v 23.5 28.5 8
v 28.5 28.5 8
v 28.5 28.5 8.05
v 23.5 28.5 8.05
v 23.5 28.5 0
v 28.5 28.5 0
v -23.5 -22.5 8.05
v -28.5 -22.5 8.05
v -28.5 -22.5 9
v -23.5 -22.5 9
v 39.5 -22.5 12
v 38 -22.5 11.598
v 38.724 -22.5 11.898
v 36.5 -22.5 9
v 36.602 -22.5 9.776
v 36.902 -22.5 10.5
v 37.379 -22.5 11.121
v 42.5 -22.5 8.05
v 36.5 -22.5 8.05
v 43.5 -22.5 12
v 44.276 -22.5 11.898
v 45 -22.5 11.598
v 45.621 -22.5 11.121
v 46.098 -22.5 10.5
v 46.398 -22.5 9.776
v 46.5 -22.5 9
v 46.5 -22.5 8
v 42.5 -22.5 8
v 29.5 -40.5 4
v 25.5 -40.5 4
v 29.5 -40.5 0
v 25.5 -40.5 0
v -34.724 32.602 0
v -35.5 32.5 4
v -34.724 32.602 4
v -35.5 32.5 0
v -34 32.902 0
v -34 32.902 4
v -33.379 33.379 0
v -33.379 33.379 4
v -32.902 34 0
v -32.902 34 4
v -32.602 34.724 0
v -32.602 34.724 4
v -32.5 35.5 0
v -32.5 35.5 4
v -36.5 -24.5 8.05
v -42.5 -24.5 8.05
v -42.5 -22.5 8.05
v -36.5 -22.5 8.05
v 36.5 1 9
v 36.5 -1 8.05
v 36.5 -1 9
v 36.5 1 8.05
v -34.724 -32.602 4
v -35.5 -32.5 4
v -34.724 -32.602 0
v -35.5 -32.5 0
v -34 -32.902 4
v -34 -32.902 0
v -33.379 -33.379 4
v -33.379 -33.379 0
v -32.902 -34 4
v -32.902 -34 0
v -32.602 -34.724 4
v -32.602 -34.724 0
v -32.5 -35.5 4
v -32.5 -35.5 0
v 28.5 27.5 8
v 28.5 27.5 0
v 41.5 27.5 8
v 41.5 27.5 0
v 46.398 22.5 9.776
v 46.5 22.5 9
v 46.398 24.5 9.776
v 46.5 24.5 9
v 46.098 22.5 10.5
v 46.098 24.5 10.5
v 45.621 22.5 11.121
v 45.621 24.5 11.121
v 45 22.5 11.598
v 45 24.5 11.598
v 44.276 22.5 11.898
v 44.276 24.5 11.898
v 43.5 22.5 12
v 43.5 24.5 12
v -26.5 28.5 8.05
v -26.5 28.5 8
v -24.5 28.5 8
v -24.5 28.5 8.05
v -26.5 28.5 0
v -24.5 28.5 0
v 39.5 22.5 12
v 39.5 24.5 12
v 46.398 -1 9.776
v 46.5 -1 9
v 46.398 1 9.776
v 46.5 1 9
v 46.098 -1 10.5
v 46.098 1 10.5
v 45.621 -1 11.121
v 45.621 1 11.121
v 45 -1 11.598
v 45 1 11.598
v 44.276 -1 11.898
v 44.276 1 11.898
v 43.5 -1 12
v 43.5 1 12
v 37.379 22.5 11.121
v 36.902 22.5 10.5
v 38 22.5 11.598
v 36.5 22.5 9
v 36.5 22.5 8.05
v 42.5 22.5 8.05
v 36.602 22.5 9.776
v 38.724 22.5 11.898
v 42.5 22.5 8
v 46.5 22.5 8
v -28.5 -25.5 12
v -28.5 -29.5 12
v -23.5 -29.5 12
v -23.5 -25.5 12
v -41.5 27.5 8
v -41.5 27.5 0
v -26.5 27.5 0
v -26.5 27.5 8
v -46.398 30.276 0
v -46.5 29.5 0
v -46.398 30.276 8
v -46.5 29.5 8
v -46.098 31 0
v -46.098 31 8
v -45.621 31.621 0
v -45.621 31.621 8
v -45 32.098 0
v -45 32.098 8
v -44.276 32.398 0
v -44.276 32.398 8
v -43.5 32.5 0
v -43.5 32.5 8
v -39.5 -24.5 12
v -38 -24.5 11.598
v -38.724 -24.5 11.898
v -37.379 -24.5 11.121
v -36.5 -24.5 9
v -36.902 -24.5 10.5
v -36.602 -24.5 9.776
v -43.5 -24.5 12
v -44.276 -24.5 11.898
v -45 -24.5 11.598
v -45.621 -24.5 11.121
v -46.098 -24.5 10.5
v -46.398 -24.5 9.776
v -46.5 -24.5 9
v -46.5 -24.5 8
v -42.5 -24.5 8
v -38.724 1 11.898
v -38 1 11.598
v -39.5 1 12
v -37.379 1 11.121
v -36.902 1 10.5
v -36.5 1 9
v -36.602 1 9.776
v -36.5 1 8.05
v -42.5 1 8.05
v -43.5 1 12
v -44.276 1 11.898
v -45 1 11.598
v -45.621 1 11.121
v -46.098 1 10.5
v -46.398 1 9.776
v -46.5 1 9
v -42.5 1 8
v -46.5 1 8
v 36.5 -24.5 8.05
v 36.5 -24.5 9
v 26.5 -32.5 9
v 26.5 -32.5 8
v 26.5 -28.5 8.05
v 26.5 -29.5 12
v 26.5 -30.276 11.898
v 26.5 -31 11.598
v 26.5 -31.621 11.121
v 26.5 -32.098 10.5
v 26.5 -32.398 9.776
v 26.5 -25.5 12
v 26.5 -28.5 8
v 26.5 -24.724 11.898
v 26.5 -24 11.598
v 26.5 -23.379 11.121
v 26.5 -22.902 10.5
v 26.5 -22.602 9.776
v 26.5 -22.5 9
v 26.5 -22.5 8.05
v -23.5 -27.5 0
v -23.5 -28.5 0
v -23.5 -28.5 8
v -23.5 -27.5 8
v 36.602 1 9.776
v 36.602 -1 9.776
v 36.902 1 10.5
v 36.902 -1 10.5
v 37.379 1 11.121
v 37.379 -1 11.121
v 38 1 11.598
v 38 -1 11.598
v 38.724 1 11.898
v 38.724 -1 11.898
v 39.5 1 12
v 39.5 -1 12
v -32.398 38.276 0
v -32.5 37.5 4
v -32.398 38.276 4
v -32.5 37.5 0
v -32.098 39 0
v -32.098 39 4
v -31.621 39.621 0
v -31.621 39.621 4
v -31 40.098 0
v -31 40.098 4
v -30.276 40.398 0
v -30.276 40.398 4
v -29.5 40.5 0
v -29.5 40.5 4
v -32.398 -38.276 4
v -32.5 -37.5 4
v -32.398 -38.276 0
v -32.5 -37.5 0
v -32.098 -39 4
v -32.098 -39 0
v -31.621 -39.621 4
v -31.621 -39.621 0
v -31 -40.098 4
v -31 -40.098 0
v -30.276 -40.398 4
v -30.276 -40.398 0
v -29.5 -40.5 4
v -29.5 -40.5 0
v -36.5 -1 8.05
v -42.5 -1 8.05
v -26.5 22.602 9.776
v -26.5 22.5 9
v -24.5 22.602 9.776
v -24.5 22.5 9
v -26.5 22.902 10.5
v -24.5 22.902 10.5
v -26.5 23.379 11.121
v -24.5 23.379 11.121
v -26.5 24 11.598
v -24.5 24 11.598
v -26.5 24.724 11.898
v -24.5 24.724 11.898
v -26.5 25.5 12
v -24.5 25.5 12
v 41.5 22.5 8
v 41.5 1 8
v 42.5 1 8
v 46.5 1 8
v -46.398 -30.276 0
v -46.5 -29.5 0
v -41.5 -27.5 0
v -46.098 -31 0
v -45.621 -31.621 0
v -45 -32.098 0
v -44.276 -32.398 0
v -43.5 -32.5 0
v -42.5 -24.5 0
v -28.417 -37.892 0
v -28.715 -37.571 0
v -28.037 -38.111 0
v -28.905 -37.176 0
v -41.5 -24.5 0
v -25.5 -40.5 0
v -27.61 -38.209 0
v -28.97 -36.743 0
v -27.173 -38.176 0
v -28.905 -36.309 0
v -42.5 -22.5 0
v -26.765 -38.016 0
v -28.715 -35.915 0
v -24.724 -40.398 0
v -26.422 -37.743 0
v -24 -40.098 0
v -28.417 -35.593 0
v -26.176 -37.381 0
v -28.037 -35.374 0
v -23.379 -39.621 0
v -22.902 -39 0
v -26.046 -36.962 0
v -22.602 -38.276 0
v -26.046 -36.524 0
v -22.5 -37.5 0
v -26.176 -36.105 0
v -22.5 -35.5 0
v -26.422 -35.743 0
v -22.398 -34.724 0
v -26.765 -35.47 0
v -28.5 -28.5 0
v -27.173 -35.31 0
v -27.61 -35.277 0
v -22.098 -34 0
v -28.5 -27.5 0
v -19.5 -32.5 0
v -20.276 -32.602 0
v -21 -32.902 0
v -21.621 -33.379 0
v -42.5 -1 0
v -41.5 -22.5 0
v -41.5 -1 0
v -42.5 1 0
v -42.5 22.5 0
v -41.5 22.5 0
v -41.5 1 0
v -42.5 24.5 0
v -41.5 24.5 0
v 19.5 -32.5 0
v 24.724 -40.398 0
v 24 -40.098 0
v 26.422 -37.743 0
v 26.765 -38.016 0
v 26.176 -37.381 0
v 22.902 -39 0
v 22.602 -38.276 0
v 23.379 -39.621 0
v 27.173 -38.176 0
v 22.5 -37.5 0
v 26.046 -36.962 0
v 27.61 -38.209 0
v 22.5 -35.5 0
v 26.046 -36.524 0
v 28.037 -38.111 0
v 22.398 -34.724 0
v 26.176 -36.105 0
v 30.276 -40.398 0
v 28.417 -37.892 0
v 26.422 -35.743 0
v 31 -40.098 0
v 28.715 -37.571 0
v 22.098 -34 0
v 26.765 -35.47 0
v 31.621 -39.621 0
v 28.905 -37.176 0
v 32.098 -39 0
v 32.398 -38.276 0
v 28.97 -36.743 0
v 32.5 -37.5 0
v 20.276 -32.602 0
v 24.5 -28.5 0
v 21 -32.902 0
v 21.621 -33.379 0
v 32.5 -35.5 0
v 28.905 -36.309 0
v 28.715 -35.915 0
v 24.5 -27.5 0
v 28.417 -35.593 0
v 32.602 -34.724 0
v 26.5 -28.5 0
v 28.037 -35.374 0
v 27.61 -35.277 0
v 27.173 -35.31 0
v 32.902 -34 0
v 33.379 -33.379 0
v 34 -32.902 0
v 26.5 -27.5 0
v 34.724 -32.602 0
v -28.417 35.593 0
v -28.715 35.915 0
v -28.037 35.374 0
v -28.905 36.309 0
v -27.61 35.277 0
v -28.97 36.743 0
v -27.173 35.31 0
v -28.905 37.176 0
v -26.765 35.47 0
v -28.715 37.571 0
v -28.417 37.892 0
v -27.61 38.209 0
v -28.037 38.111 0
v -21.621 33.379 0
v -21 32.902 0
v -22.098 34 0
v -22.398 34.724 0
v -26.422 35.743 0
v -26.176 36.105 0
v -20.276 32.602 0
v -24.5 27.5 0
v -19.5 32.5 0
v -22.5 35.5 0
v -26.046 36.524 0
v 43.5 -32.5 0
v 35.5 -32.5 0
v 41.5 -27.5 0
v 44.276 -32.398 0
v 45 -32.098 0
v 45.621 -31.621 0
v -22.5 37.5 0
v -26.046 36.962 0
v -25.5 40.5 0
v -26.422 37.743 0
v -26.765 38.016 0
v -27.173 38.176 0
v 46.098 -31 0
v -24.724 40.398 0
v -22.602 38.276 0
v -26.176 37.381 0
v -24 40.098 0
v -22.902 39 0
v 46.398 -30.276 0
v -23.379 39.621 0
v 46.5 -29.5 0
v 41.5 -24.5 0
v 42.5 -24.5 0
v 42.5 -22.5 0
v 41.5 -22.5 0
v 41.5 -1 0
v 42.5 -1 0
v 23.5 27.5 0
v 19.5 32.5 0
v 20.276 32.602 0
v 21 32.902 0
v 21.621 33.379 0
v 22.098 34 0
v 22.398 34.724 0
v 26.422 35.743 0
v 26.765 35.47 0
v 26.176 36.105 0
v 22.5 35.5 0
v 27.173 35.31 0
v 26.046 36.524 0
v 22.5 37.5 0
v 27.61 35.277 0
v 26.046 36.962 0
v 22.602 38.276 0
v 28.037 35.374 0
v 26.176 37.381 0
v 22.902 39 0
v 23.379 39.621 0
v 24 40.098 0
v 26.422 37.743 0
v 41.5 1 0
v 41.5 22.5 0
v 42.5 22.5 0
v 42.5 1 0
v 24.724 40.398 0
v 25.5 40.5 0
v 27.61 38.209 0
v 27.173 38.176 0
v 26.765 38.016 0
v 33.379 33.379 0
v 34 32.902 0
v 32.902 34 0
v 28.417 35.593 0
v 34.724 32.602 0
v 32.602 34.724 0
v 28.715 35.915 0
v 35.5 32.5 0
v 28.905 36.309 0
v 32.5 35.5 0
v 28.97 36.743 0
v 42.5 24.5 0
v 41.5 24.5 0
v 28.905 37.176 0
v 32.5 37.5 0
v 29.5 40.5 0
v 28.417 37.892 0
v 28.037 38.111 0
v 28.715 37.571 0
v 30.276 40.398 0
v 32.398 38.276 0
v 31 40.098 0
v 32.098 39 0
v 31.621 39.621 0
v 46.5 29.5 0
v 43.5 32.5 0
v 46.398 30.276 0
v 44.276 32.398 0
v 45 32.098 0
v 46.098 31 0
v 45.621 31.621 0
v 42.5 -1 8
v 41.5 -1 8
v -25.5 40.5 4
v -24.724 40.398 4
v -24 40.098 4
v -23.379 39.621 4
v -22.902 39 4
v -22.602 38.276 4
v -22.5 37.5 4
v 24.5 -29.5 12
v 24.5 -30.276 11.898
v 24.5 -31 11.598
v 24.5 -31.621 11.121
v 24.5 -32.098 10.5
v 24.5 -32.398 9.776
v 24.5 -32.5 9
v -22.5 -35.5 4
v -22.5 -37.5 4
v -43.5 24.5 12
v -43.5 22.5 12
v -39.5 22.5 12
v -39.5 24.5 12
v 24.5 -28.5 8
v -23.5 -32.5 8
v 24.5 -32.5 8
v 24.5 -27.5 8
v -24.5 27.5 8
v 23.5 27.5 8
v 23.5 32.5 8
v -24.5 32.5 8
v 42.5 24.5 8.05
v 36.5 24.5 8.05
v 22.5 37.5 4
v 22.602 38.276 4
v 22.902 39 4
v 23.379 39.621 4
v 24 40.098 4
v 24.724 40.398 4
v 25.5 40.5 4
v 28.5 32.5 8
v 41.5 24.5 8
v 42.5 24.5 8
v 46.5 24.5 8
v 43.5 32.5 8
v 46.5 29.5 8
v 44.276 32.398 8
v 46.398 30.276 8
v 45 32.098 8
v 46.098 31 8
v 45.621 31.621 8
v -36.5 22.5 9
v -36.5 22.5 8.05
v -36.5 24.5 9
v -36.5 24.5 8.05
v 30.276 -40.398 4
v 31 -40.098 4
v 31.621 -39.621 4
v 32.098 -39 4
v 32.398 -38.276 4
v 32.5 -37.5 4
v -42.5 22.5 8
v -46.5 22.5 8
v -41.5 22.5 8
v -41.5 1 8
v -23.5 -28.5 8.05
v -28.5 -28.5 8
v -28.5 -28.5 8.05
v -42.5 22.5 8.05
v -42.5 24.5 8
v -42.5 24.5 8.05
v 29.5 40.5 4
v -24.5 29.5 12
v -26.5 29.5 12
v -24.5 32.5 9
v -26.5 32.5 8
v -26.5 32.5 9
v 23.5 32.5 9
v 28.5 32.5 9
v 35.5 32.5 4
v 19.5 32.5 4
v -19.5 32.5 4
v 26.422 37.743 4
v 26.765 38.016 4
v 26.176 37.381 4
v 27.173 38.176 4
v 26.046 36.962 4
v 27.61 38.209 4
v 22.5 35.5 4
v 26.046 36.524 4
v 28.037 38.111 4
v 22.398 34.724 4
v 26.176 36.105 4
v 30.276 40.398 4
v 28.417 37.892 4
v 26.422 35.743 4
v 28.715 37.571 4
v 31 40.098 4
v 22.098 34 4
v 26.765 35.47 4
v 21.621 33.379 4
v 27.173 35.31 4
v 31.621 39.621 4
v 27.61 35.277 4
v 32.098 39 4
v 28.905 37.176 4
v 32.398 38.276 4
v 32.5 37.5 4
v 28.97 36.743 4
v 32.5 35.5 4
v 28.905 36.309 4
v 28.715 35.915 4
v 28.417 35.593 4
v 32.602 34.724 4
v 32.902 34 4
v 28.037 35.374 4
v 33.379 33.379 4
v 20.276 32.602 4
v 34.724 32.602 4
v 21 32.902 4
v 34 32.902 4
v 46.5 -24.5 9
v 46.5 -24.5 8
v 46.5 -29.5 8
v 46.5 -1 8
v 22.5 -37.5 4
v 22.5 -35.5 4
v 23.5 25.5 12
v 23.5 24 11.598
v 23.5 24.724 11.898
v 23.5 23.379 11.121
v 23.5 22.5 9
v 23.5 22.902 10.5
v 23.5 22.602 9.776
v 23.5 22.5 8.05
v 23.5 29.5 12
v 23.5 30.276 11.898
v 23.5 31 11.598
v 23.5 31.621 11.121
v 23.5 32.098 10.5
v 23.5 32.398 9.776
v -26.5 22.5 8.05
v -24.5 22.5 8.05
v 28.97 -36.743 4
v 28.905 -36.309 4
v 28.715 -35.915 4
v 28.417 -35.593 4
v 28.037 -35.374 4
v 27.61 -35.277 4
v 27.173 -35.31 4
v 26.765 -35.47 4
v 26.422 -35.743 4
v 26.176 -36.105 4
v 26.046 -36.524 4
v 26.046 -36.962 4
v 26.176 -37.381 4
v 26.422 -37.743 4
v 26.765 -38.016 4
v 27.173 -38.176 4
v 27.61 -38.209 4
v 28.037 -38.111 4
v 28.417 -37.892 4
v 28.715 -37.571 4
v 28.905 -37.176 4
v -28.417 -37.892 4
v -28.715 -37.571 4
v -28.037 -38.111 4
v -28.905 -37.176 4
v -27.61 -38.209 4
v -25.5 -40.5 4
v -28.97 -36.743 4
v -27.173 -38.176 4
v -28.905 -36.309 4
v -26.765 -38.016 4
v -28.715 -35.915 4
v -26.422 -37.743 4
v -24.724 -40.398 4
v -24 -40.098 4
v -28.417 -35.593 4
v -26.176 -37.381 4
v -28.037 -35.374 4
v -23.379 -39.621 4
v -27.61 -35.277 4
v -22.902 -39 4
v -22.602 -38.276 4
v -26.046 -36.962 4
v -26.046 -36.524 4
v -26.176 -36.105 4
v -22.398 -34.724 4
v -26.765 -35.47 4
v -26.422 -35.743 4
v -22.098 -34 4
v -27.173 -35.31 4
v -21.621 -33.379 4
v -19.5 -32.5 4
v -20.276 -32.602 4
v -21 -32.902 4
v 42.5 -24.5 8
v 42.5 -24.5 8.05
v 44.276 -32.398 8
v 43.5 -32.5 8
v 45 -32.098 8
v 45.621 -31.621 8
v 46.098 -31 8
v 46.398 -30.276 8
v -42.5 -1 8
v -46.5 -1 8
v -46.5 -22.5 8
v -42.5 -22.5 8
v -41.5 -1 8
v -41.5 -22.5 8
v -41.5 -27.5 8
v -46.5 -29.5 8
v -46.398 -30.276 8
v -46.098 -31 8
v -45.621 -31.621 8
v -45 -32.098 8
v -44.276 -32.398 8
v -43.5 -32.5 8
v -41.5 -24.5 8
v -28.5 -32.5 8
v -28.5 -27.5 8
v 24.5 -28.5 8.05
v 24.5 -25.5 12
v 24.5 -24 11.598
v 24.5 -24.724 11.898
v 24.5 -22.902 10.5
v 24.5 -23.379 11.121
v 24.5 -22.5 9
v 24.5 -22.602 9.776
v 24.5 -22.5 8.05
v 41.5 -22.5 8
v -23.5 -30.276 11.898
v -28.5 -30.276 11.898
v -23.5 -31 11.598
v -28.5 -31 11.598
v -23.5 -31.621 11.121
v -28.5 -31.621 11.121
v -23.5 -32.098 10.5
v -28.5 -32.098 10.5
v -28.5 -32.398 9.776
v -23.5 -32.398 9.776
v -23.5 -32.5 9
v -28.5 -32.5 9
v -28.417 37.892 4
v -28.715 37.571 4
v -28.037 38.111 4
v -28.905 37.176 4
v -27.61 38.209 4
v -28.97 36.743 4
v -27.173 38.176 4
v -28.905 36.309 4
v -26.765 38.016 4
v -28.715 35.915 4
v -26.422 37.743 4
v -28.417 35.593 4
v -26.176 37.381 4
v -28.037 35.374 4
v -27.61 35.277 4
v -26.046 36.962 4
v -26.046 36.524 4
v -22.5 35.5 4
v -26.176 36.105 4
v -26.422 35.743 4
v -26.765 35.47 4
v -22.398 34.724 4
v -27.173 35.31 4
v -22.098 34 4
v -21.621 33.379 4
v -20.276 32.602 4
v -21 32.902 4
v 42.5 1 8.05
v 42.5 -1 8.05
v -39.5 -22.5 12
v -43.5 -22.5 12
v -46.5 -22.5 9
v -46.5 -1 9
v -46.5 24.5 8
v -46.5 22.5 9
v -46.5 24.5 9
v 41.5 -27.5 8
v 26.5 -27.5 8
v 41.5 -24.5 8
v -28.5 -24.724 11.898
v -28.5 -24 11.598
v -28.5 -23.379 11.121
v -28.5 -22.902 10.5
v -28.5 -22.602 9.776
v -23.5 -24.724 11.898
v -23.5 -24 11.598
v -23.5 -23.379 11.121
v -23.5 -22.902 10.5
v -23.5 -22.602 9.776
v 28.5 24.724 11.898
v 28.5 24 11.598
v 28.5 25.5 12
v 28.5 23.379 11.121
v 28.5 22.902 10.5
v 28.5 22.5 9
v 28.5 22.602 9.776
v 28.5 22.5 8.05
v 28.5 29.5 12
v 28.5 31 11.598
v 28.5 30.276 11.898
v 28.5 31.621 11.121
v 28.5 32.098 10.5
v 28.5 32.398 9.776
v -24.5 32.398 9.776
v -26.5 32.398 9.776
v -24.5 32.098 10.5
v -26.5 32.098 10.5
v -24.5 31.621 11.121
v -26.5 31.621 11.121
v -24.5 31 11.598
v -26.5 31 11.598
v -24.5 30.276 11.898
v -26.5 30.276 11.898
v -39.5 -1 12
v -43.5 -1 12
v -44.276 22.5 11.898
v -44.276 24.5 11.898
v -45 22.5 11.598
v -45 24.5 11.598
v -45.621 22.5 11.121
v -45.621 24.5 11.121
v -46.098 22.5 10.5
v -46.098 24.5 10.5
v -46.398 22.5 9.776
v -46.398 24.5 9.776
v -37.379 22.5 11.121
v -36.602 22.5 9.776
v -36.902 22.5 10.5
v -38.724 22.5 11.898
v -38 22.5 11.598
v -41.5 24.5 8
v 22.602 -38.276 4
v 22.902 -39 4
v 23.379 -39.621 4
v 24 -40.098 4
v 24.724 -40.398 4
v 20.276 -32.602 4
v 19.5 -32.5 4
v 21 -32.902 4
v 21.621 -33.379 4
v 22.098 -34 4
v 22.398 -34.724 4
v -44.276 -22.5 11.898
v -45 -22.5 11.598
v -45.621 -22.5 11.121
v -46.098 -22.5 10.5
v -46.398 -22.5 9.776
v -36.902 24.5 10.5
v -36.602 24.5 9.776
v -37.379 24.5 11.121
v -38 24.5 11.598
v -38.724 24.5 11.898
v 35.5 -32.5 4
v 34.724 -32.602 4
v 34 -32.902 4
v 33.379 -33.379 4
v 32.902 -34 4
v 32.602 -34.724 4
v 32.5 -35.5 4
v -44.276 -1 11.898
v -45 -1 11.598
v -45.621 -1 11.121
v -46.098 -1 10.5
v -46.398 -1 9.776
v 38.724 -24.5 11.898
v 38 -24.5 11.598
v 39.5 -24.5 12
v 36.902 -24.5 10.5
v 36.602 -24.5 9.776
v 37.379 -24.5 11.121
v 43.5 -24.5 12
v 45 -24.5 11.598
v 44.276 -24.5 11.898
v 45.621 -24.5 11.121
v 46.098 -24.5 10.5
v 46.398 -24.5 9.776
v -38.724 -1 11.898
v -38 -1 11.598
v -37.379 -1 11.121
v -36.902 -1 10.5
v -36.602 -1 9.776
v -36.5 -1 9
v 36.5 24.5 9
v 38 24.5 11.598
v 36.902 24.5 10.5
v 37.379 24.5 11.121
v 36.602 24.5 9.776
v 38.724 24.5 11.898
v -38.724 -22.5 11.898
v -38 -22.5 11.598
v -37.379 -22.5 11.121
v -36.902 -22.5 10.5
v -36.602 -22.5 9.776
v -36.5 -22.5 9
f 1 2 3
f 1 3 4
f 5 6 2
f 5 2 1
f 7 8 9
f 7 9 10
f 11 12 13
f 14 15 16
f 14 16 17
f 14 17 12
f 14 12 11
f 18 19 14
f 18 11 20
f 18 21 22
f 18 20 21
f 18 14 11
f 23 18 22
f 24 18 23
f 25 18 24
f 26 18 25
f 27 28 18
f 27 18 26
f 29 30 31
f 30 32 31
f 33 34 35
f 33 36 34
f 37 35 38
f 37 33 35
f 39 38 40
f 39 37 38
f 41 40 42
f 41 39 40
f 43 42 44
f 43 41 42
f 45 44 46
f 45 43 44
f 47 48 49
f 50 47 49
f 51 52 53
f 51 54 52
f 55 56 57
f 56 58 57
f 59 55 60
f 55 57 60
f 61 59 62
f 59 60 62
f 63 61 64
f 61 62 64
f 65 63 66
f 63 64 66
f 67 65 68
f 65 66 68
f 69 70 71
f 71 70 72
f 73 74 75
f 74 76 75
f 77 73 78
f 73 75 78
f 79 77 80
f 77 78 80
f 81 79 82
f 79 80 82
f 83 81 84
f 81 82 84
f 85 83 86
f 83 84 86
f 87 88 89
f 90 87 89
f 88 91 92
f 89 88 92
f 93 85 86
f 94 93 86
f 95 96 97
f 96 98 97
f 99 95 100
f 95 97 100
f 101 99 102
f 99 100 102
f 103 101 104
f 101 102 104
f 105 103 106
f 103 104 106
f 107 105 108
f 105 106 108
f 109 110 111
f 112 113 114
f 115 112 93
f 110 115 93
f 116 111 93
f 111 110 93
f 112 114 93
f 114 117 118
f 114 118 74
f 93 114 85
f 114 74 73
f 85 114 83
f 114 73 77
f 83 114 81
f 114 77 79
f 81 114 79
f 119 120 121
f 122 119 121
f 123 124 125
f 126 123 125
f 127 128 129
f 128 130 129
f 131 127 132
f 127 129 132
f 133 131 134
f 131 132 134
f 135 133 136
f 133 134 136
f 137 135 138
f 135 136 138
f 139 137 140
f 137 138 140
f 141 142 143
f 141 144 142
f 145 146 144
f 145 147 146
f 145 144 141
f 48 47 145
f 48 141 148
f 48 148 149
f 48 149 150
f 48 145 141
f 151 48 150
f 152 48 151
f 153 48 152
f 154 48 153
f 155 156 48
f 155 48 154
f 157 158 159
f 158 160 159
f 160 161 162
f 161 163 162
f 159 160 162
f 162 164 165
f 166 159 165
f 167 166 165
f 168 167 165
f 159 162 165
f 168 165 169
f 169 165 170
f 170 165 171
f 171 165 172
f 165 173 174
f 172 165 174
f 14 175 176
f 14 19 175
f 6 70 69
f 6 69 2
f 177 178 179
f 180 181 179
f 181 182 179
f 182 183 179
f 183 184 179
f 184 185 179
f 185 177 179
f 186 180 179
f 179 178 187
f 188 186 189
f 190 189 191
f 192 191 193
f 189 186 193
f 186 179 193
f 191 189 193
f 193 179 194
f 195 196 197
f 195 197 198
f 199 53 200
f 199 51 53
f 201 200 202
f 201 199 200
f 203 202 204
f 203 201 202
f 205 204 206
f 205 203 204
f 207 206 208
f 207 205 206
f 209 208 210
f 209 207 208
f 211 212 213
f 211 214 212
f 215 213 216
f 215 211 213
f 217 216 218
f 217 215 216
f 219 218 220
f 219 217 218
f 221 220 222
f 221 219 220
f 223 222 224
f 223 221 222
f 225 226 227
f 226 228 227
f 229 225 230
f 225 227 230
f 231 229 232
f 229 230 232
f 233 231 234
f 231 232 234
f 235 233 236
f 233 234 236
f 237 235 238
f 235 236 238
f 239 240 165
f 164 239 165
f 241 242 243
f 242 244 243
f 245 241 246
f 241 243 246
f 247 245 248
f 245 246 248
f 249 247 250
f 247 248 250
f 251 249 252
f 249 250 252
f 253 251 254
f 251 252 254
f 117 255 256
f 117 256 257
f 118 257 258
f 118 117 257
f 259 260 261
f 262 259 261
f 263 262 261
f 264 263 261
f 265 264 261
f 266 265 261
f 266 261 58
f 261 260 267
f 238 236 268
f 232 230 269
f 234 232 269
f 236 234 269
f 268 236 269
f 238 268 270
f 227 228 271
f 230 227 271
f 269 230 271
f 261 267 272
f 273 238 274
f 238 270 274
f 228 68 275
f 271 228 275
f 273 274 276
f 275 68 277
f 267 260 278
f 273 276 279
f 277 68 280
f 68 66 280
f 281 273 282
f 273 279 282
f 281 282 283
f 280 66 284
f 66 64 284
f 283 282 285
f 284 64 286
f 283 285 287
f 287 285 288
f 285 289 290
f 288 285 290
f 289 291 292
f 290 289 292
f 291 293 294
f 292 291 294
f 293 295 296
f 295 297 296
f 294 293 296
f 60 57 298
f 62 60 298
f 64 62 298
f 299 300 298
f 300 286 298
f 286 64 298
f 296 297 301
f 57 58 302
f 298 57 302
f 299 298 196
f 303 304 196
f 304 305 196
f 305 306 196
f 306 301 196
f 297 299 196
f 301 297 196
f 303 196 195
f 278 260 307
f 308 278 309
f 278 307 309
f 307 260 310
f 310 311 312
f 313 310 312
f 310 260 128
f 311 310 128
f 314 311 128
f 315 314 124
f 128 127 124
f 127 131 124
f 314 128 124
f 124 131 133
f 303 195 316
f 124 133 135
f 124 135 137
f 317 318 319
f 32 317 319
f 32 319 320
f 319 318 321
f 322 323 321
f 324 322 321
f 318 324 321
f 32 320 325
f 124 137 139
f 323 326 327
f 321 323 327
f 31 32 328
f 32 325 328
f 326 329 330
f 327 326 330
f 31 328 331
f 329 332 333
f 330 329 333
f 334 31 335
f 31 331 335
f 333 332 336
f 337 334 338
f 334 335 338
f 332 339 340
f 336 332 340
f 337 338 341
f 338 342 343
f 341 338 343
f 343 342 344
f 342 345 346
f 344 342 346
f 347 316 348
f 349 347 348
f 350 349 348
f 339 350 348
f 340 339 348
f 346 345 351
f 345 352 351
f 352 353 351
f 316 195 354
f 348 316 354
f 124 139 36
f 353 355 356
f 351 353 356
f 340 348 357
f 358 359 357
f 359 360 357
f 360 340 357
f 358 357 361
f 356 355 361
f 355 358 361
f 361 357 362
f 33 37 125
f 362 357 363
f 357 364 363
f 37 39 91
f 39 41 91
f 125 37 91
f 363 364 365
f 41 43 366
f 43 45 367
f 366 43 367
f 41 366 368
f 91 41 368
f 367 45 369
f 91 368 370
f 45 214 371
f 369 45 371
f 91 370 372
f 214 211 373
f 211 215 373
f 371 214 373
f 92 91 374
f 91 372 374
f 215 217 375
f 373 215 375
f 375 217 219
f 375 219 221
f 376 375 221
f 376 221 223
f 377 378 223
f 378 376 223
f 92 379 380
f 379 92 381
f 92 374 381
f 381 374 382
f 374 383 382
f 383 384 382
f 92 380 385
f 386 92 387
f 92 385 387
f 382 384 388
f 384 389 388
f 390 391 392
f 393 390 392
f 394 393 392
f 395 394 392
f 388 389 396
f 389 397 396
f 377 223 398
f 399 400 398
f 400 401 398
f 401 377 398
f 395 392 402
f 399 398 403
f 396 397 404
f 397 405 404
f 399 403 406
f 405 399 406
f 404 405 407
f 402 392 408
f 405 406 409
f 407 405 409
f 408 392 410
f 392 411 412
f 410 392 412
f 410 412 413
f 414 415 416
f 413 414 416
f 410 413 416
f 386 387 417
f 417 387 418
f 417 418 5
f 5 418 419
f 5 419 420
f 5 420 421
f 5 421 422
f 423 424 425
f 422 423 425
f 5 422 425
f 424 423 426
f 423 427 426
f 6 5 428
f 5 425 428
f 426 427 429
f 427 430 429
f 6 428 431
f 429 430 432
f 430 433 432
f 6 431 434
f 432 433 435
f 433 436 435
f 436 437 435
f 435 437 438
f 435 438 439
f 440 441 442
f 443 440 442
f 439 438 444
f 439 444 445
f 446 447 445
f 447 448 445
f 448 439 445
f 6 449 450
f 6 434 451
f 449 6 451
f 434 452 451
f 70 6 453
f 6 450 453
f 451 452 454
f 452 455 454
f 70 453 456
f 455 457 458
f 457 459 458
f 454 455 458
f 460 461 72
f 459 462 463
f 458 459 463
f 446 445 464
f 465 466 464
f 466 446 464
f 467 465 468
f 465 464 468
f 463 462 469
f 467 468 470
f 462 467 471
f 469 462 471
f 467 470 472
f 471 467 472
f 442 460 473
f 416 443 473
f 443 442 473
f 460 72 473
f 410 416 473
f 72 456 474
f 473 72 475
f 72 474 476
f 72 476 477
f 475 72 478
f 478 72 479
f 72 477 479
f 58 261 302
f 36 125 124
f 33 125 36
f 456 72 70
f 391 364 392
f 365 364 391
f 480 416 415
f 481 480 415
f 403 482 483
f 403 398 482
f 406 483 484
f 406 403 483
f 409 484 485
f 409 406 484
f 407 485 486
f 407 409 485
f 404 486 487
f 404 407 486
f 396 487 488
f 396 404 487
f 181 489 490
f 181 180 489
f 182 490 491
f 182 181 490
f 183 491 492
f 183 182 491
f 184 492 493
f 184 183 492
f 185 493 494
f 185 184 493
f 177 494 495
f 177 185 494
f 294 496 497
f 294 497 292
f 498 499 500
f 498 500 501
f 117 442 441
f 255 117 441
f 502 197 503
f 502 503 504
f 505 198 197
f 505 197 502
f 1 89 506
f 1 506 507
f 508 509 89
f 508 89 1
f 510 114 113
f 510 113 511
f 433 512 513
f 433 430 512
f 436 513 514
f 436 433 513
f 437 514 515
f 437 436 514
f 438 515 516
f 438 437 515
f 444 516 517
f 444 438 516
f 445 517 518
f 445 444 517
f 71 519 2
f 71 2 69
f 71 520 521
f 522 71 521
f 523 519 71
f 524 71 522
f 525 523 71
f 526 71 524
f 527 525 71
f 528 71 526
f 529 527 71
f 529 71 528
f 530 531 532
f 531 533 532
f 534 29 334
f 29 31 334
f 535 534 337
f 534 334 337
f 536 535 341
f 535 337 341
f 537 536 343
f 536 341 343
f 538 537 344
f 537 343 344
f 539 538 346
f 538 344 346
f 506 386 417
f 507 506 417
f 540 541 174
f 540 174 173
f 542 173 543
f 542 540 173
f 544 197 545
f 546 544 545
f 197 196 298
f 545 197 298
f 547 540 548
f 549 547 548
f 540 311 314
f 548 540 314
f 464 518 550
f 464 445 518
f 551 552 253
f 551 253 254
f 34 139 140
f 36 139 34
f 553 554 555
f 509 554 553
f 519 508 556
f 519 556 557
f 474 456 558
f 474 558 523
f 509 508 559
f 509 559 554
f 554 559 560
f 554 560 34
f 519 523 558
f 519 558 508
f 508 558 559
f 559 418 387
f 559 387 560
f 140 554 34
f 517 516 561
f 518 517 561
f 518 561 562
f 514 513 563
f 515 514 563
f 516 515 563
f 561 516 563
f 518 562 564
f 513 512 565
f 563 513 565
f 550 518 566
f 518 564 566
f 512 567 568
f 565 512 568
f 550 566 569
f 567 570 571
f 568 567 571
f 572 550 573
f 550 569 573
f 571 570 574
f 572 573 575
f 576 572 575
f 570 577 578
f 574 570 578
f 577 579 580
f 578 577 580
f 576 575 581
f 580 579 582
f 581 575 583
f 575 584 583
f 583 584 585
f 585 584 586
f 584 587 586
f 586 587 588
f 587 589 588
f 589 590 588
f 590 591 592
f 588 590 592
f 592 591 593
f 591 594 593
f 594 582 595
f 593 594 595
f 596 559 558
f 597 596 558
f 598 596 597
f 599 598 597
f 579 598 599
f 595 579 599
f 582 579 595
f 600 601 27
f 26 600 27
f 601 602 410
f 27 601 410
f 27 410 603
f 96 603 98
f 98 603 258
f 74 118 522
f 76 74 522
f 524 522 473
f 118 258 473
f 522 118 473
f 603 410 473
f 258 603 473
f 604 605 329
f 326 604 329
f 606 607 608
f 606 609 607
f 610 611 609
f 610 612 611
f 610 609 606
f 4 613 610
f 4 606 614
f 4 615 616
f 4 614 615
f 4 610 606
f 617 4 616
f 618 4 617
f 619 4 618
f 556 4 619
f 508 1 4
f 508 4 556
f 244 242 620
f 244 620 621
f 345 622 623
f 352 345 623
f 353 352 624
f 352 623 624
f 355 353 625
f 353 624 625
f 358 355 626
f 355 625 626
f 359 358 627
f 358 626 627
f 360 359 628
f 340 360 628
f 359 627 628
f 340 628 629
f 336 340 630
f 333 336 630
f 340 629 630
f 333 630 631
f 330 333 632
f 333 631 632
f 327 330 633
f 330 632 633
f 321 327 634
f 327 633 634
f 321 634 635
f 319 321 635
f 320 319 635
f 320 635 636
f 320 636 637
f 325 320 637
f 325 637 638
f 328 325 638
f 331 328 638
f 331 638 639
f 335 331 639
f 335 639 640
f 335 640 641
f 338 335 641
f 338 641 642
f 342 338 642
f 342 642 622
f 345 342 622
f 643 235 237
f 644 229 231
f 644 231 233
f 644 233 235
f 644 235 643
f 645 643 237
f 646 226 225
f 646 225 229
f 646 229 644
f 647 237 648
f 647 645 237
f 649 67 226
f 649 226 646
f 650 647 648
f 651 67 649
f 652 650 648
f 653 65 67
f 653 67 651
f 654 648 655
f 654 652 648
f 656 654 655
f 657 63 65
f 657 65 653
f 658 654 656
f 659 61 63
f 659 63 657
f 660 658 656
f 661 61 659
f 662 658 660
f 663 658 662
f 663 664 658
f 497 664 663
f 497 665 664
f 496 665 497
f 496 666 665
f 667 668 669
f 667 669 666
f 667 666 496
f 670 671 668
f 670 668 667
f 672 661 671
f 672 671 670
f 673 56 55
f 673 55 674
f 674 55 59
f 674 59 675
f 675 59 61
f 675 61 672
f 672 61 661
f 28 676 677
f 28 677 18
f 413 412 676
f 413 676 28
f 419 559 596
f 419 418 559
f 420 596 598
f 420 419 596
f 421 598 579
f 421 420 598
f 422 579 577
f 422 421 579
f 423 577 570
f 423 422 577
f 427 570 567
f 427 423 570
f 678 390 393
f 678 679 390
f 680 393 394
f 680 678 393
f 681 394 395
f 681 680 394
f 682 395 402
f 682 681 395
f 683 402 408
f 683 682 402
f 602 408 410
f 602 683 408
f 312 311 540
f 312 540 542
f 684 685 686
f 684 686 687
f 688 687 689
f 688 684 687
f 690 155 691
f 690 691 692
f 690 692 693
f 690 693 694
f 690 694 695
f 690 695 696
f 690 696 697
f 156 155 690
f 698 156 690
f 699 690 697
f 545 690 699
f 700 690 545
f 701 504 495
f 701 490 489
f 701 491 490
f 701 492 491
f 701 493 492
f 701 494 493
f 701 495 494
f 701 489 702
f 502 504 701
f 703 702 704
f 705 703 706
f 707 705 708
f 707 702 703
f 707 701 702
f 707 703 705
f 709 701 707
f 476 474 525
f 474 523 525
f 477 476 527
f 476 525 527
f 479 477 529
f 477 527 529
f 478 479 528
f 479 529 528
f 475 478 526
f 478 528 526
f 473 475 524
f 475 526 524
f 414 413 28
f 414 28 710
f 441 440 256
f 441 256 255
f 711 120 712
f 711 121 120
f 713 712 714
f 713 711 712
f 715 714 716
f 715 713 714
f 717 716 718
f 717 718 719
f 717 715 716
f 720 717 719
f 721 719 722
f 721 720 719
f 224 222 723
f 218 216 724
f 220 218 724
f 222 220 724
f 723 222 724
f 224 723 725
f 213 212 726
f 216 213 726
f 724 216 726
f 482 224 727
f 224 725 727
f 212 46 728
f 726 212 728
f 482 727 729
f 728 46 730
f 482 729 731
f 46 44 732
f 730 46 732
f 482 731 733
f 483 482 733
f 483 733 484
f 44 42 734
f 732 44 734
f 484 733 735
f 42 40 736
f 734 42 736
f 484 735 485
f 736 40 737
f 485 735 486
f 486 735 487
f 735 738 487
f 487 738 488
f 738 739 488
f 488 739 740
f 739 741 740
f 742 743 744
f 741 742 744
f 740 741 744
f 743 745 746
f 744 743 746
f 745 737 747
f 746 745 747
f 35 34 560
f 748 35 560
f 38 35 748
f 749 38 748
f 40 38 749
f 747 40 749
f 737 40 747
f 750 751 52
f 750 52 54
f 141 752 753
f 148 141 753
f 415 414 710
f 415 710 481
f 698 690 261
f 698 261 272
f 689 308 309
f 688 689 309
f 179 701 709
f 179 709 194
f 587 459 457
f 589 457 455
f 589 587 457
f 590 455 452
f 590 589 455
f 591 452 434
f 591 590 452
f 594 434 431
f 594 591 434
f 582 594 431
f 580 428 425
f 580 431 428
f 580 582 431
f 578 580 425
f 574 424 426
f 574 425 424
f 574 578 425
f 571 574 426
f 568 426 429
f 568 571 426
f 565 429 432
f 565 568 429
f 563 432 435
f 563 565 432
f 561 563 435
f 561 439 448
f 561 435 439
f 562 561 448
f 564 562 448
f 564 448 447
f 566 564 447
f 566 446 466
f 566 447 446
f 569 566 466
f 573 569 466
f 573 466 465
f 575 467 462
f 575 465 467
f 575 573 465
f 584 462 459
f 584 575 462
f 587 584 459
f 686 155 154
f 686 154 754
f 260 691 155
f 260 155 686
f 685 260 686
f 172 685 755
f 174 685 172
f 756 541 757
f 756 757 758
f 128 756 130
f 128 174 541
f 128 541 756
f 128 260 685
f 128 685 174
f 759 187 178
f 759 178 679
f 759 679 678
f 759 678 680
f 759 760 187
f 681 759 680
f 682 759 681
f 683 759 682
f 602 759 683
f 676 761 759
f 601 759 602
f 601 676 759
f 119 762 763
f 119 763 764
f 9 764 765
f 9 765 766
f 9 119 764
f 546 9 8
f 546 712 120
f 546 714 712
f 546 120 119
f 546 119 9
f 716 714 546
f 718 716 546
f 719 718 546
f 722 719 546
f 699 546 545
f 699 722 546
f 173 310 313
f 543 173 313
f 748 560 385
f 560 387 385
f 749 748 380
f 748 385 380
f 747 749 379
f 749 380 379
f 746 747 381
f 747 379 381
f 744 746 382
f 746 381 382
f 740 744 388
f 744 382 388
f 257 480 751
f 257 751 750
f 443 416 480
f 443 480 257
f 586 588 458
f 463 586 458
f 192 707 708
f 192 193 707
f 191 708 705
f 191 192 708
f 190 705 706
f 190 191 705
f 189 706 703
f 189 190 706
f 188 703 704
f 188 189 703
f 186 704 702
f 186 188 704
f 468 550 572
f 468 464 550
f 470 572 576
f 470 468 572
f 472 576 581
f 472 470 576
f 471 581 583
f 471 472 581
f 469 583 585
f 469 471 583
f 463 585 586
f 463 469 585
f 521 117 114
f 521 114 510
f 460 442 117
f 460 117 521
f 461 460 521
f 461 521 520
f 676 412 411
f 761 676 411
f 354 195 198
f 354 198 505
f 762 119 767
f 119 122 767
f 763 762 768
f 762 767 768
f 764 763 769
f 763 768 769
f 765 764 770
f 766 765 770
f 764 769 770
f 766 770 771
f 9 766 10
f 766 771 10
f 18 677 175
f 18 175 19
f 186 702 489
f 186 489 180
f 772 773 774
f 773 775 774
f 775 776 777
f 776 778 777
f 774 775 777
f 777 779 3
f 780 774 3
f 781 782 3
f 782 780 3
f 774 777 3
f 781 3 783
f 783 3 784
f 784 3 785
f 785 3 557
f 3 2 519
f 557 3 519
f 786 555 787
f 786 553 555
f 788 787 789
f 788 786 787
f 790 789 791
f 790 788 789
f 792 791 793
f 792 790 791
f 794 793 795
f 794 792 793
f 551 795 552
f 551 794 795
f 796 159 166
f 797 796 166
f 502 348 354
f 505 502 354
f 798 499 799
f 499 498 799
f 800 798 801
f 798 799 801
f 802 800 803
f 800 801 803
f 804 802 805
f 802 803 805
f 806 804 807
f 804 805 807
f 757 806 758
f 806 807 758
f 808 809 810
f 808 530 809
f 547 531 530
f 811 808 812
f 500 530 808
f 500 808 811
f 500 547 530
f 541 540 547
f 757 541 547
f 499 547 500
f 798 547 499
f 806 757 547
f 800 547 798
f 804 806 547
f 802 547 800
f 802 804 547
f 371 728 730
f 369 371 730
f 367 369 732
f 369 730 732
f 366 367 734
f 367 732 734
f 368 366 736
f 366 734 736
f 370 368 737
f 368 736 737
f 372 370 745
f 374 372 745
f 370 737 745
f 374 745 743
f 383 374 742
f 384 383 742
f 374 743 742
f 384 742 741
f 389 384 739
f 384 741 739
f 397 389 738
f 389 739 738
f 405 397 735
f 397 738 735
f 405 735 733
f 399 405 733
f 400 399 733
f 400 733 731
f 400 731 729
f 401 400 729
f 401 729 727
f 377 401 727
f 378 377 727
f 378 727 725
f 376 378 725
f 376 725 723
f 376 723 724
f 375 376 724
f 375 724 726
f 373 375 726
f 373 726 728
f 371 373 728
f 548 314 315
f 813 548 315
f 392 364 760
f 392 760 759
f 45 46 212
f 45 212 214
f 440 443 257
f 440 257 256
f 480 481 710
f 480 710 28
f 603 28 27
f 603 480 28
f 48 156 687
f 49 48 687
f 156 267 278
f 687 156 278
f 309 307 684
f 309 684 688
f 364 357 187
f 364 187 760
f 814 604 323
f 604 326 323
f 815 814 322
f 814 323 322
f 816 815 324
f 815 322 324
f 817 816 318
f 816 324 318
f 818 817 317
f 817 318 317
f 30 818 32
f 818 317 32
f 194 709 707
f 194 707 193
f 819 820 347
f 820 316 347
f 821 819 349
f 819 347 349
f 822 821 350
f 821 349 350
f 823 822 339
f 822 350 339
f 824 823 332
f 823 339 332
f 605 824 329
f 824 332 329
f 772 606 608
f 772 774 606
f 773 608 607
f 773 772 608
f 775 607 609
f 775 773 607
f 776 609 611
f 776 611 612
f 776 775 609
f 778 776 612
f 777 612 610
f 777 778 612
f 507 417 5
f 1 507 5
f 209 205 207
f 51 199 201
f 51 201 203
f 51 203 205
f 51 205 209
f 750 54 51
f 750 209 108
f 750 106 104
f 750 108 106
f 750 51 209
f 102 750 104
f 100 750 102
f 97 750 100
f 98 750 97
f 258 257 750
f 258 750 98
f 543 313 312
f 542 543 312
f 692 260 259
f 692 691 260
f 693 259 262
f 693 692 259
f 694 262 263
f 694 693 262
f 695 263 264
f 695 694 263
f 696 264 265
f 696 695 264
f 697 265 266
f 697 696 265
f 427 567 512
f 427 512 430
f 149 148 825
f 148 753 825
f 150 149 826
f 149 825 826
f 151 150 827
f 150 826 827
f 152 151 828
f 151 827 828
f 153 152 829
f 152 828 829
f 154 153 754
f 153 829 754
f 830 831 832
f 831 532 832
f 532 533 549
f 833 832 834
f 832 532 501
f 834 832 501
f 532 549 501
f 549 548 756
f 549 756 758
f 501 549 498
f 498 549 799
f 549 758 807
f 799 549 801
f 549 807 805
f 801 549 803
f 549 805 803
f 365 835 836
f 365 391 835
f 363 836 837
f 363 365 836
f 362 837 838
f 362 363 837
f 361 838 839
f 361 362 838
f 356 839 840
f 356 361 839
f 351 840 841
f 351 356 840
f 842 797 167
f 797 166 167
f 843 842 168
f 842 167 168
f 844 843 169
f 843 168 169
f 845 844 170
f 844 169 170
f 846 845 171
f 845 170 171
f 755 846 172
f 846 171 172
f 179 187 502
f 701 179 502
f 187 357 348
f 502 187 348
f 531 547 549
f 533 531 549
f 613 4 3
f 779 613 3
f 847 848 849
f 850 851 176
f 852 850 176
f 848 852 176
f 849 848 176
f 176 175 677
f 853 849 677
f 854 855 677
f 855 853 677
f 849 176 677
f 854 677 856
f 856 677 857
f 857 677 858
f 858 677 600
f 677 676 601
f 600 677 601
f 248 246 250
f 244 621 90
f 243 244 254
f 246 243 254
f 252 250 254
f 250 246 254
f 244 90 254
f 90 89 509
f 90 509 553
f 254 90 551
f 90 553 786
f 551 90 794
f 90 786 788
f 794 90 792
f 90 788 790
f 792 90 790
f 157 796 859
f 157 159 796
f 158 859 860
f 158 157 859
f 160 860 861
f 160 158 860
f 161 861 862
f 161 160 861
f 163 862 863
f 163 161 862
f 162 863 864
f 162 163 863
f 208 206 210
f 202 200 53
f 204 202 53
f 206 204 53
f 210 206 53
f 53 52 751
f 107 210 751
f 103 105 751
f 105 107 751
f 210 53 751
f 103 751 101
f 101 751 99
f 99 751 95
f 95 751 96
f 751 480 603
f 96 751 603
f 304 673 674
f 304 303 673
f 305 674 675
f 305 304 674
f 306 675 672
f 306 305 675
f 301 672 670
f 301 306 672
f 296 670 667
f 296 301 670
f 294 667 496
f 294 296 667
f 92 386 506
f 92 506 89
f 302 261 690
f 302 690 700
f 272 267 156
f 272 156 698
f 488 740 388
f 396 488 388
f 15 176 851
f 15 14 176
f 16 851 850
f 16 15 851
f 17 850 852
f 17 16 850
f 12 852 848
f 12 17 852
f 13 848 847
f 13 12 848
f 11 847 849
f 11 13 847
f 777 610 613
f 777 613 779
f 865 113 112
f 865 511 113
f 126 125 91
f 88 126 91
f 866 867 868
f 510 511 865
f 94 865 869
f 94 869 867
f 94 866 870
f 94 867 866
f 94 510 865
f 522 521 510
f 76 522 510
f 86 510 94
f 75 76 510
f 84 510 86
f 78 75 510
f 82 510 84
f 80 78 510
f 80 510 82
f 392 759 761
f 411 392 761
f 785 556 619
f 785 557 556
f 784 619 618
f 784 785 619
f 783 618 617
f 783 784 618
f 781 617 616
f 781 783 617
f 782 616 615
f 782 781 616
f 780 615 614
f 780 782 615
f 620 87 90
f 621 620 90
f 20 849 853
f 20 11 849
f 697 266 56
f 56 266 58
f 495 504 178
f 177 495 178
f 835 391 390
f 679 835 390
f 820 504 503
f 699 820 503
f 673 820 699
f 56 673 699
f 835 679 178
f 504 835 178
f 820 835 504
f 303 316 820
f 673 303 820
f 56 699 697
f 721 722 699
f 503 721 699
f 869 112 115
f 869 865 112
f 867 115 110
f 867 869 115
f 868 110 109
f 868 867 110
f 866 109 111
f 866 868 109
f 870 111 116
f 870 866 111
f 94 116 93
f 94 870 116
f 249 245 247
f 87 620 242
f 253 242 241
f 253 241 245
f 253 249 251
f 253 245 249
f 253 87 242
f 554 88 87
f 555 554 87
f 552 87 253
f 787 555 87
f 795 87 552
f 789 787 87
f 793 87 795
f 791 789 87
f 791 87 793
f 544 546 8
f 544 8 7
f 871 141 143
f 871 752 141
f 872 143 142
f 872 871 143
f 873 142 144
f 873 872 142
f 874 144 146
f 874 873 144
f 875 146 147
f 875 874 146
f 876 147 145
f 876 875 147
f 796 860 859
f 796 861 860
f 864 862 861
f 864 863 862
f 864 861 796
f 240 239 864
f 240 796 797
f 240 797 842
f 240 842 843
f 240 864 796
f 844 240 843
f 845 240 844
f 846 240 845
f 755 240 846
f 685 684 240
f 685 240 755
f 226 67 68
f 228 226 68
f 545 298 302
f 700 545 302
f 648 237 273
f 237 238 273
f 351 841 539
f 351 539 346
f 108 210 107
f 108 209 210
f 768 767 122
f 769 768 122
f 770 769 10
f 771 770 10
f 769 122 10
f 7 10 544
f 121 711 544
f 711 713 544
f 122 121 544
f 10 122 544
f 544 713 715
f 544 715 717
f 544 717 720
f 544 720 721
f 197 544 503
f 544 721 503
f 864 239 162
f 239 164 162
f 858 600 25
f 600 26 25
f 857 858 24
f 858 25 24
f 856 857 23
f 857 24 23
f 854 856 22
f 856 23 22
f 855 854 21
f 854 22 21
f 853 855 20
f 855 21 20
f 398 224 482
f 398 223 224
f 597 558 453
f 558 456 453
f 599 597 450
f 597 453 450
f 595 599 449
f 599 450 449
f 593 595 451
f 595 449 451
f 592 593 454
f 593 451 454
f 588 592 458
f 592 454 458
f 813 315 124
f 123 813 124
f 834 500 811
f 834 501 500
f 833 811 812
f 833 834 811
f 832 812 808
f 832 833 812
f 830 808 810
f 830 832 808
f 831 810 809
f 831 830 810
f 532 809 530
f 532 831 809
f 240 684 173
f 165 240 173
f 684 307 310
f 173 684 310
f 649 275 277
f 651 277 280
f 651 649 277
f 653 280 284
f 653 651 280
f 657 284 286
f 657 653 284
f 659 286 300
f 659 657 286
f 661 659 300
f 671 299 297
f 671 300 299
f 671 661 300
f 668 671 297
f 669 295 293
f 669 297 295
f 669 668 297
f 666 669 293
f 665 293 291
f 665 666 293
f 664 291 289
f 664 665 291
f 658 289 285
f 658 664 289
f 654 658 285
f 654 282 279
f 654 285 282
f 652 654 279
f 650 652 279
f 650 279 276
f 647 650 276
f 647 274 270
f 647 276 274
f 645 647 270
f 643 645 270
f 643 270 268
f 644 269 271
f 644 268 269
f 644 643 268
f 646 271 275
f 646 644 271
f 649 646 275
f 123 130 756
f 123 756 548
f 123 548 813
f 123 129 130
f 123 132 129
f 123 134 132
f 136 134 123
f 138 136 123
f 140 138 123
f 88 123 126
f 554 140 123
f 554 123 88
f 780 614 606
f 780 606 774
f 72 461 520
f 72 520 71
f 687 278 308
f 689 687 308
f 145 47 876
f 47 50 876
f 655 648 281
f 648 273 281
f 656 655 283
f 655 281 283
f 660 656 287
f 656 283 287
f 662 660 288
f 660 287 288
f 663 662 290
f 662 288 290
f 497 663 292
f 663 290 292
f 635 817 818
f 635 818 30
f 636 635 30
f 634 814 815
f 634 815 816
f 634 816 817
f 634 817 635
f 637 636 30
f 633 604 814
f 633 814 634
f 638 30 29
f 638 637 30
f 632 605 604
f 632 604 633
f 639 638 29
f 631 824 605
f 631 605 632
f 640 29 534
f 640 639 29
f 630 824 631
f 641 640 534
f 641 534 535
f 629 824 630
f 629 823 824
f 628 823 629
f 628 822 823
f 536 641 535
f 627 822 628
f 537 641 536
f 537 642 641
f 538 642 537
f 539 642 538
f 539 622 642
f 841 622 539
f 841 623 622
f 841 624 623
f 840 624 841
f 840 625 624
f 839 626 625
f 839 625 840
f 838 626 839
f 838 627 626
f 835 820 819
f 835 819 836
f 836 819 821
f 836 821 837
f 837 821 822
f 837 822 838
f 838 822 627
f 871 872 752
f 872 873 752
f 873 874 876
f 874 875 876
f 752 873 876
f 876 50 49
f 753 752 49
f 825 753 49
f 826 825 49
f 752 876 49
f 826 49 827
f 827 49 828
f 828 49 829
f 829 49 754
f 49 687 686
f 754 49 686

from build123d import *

# Parameters (mm, degrees)
SKETCH1_W               = 93
SKETCH1_H               = 65
SKETCH1_W_2             = 83
SKETCH1_H_2             = 55
BOSS_EXTRUDE1_DEPTH     = 8
FILLET1_R               = 3
SKETCH2_W               = 10
SKETCH2_H               = 4
BOSS_EXTRUDE6_DEPTH     = 8
FILLET3_R               = 3
SKETCH9_R               = 1.47
CUT_EXTRUDE1_DEPTH      = 5
MIRROR4_COPY_1_SKETCH_R = 1.47
MIRROR4_COPY_1_DEPTH    = 5
FILLET4_R               = 3
SKETCH10_W              = 2
SKETCH10_H              = 1
SKETCH10_W_2            = 5
CUT_EXTRUDE2_DEPTH      = 9
SKETCH11_W              = 2
SKETCH11_H              = 1
SKETCH11_W_2            = 5
CUT_EXTRUDE3_DEPTH      = 9
SKETCH12_W              = 1
SKETCH12_H              = 2
CUT_EXTRUDE4_DEPTH      = 9
SKETCH14_W              = 4
SKETCH14_H              = 2
BOSS_EXTRUDE14_DEPTH    = 4
SKETCH15_W              = 3.95
SKETCH15_H              = 2
BOSS_EXTRUDE18_DEPTH    = 6
SKETCH16_W              = 2
SKETCH16_H              = 4
SKETCH16_W_2            = 5
BOSS_EXTRUDE19_DEPTH    = 4
SKETCH17_W              = 2
SKETCH17_H              = 3.95
SKETCH17_W_2            = 5
BOSS_EXTRUDE20_DEPTH    = 6
SKETCH18_W              = 5
SKETCH18_H              = 3.95
SKETCH18_W_2            = 2
BOSS_EXTRUDE21_DEPTH    = 6
FILLET6_R               = 3


with BuildPart() as part:
    # Sketch1 → Boss-Extrude1 (new body)
    with BuildSketch(Plane.XY):
        Rectangle(SKETCH1_W, SKETCH1_H)
        Rectangle(SKETCH1_W_2, SKETCH1_H_2, mode=Mode.SUBTRACT)
    extrude(amount=BOSS_EXTRUDE1_DEPTH)

    # Fillet1
    fillet1_edges = [part.edges().sort_by_distance(p)[0] for p in [
        (-46.5, 32.5, 4),
        (46.5, 32.5, 4),
        (46.5, -32.5, 4),
        (-46.5, -32.5, 4),
    ]]
    fillet(fillet1_edges, radius=FILLET1_R)

    # Sketch2 → Boss-Extrude6 (add)
    with BuildSketch(Plane(origin=(0, 32.5, 0), x_dir=(1, 0, 0), z_dir=(0, 1, 0))):
        with Locations((-27.5, -2)):
            Rectangle(SKETCH2_W, SKETCH2_H)
        with Locations((27.5, -2)):
            Rectangle(SKETCH2_W, SKETCH2_H)
    boss_extrude6 = extrude(amount=BOSS_EXTRUDE6_DEPTH)

    # Mirror2: Boss-Extrude6 across plane
    add(boss_extrude6.mirror(Plane.ZX))

    # Fillet3
    fillet3_edges = [part.edges().sort_by_distance(p)[0] for p in [
        (32.5, -32.5, 2),
        (22.5, -32.5, 2),
        (-22.5, 32.5, 2),
        (-32.5, 32.5, 2),
        (32.5, 32.5, 2),
        (22.5, 32.5, 2),
        (-22.5, -32.5, 2),
        (-32.5, -32.5, 2),
    ]]
    fillet(fillet3_edges, radius=FILLET3_R)

    # Sketch9 → Cut-Extrude1 (cut, through all)
    with BuildSketch(Plane.XY.offset(4)):
        with Locations((27.5, -36.742693553)):
            Circle(SKETCH9_R)
    cut_extrude1 = extrude(amount=-CUT_EXTRUDE1_DEPTH, mode=Mode.SUBTRACT)

    # Mirror3: Cut-Extrude1 across plane
    add(cut_extrude1.mirror(Plane(origin=(0, 0, 0), x_dir=(0, 0, 1), z_dir=(1, 0, 0))), mode=Mode.SUBTRACT)

    # Mirror4: Cut-Extrude1 across plane
    add(cut_extrude1.mirror(Plane.ZX), mode=Mode.SUBTRACT)

    # Mirror4 copy 1 sketch → Mirror4 copy 1 (cut, through all)
    with BuildSketch(Plane(origin=(0, 0, 4), x_dir=(-1, 0, 0), z_dir=(0, 0, 1))):
        with Locations((27.5, -36.742693553)):
            Circle(MIRROR4_COPY_1_SKETCH_R)
    extrude(amount=-MIRROR4_COPY_1_DEPTH, mode=Mode.SUBTRACT)

    # Fillet4
    fillet4_edges = [part.edges().sort_by_distance(p)[0] for p in [
        (32.5, -40.5, 2),
        (22.5, -40.5, 2),
        (-22.5, 40.5, 2),
        (-32.5, 40.5, 2),
        (32.5, 40.5, 2),
        (22.5, 40.5, 2),
        (-22.5, -40.5, 2),
        (-32.5, -40.5, 2),
    ]]
    fillet(fillet4_edges, radius=FILLET4_R)

    # Sketch10 → Cut-Extrude2 (cut, through all)
    with BuildSketch(Plane(origin=(0, 0, 0), x_dir=(-1, 0, 0), z_dir=(0, 0, -1))):
        with Locations((-25.5, -28)):
            Rectangle(SKETCH10_W, SKETCH10_H)
        with Locations((26, -28)):
            Rectangle(SKETCH10_W_2, SKETCH10_H)
    extrude(amount=-CUT_EXTRUDE2_DEPTH, mode=Mode.SUBTRACT)

    # Sketch11 → Cut-Extrude3 (cut, through all)
    with BuildSketch(Plane(origin=(0, 0, 0), x_dir=(-1, 0, 0), z_dir=(0, 0, -1))):
        with Locations((25.5, 28)):
            Rectangle(SKETCH11_W, SKETCH11_H)
        with Locations((-26, 28)):
            Rectangle(SKETCH11_W_2, SKETCH11_H)
    extrude(amount=-CUT_EXTRUDE3_DEPTH, mode=Mode.SUBTRACT)

    # Sketch12 → Cut-Extrude4 (cut, through all)
    with BuildSketch(Plane(origin=(0, 0, 0), x_dir=(-1, 0, 0), z_dir=(0, 0, -1))):
        with Locations((-42, 0)):
            Rectangle(SKETCH12_W, SKETCH12_H)
        with Locations((-42, -23.5)):
            Rectangle(SKETCH12_W, SKETCH12_H)
        with Locations((-42, 23.5)):
            Rectangle(SKETCH12_W, SKETCH12_H)
    cut_extrude4 = extrude(amount=-CUT_EXTRUDE4_DEPTH, mode=Mode.SUBTRACT)

    # Mirror5: Cut-Extrude4 across plane
    add(cut_extrude4.mirror(Plane(origin=(0, 0, 0), x_dir=(0, 0, 1), z_dir=(1, 0, 0))), mode=Mode.SUBTRACT)

    # Sketch14 → Boss-Extrude14 (add)
    with BuildSketch(Plane.XY.offset(8)):
        with Locations((44.5, 23.5)):
            Rectangle(SKETCH14_W, SKETCH14_H)
        with Locations((44.5, 0)):
            Rectangle(SKETCH14_W, SKETCH14_H)
        with Locations((44.5, -23.5)):
            Rectangle(SKETCH14_W, SKETCH14_H)
    boss_extrude14 = extrude(amount=BOSS_EXTRUDE14_DEPTH)

    # Mirror6: Boss-Extrude14 across plane
    add(boss_extrude14.mirror(Plane(origin=(0, 0, 0), x_dir=(0, 0, 1), z_dir=(1, 0, 0))))

    # Sketch15 → Boss-Extrude18 (add)
    with BuildSketch(Plane.ZY.offset(-42.5)):
        with Locations((10.025, 23.5)):
            Rectangle(SKETCH15_W, SKETCH15_H)
        with Locations((10.025, 0)):
            Rectangle(SKETCH15_W, SKETCH15_H)
        with Locations((10.025, -23.5)):
            Rectangle(SKETCH15_W, SKETCH15_H)
    boss_extrude18 = extrude(amount=BOSS_EXTRUDE18_DEPTH)

    # Mirror7: Boss-Extrude18 across plane
    add(boss_extrude18.mirror(Plane(origin=(0, 0, 0), x_dir=(0, 0, 1), z_dir=(1, 0, 0))))

    # Sketch16 → Boss-Extrude19 (add)
    with BuildSketch(Plane.XY.offset(8)):
        with Locations((-25.5, 30.5)):
            Rectangle(SKETCH16_W, SKETCH16_H)
        with Locations((26, 30.5)):
            Rectangle(SKETCH16_W_2, SKETCH16_H)
        with Locations((25.5, -30.5)):
            Rectangle(SKETCH16_W, SKETCH16_H)
        with Locations((-26, -30.5)):
            Rectangle(SKETCH16_W_2, SKETCH16_H)
    extrude(amount=BOSS_EXTRUDE19_DEPTH)

    # Sketch17 → Boss-Extrude20 (add)
    with BuildSketch(Plane.XZ.offset(-28.5)):
        with Locations((-25.5, 10.025)):
            Rectangle(SKETCH17_W, SKETCH17_H)
        with Locations((26, 10.025)):
            Rectangle(SKETCH17_W_2, SKETCH17_H)
    extrude(amount=BOSS_EXTRUDE20_DEPTH)

    # Sketch18 → Boss-Extrude21 (add)
    with BuildSketch(Plane(origin=(0, -28.5, 0), x_dir=(1, 0, 0), z_dir=(0, 1, 0))):
        with Locations((-26, -10.025)):
            Rectangle(SKETCH18_W, SKETCH18_H)
        with Locations((25.5, -10.025)):
            Rectangle(SKETCH18_W_2, SKETCH18_H)
    extrude(amount=BOSS_EXTRUDE21_DEPTH)

    # Fillet6
    fillet6_edges = [part.edges().sort_by_distance(p)[0] for p in [
        (-25.5, 32.5, 12),
        (-25.5, 22.5, 12),
        (-36.5, 23.5, 12),
        (-46.5, 23.5, 12),
        (-36.5, 0, 12),
        (-46.5, 0, 12),
        (-36.5, -23.5, 12),
        (-46.5, -23.5, 12),
        (-26, -32.5, 12),
        (-26, -22.5, 12),
        (25.5, -32.5, 12),
        (25.5, -22.5, 12),
        (36.5, -23.5, 12),
        (46.5, -23.5, 12),
        (46.5, 0, 12),
        (36.5, 0, 12),
        (36.5, 23.5, 12),
        (26, 22.5, 12),
        (26, 32.5, 12),
        (46.5, 23.5, 12),
    ]]
    fillet(fillet6_edges, radius=FILLET6_R)


solid = part.part
